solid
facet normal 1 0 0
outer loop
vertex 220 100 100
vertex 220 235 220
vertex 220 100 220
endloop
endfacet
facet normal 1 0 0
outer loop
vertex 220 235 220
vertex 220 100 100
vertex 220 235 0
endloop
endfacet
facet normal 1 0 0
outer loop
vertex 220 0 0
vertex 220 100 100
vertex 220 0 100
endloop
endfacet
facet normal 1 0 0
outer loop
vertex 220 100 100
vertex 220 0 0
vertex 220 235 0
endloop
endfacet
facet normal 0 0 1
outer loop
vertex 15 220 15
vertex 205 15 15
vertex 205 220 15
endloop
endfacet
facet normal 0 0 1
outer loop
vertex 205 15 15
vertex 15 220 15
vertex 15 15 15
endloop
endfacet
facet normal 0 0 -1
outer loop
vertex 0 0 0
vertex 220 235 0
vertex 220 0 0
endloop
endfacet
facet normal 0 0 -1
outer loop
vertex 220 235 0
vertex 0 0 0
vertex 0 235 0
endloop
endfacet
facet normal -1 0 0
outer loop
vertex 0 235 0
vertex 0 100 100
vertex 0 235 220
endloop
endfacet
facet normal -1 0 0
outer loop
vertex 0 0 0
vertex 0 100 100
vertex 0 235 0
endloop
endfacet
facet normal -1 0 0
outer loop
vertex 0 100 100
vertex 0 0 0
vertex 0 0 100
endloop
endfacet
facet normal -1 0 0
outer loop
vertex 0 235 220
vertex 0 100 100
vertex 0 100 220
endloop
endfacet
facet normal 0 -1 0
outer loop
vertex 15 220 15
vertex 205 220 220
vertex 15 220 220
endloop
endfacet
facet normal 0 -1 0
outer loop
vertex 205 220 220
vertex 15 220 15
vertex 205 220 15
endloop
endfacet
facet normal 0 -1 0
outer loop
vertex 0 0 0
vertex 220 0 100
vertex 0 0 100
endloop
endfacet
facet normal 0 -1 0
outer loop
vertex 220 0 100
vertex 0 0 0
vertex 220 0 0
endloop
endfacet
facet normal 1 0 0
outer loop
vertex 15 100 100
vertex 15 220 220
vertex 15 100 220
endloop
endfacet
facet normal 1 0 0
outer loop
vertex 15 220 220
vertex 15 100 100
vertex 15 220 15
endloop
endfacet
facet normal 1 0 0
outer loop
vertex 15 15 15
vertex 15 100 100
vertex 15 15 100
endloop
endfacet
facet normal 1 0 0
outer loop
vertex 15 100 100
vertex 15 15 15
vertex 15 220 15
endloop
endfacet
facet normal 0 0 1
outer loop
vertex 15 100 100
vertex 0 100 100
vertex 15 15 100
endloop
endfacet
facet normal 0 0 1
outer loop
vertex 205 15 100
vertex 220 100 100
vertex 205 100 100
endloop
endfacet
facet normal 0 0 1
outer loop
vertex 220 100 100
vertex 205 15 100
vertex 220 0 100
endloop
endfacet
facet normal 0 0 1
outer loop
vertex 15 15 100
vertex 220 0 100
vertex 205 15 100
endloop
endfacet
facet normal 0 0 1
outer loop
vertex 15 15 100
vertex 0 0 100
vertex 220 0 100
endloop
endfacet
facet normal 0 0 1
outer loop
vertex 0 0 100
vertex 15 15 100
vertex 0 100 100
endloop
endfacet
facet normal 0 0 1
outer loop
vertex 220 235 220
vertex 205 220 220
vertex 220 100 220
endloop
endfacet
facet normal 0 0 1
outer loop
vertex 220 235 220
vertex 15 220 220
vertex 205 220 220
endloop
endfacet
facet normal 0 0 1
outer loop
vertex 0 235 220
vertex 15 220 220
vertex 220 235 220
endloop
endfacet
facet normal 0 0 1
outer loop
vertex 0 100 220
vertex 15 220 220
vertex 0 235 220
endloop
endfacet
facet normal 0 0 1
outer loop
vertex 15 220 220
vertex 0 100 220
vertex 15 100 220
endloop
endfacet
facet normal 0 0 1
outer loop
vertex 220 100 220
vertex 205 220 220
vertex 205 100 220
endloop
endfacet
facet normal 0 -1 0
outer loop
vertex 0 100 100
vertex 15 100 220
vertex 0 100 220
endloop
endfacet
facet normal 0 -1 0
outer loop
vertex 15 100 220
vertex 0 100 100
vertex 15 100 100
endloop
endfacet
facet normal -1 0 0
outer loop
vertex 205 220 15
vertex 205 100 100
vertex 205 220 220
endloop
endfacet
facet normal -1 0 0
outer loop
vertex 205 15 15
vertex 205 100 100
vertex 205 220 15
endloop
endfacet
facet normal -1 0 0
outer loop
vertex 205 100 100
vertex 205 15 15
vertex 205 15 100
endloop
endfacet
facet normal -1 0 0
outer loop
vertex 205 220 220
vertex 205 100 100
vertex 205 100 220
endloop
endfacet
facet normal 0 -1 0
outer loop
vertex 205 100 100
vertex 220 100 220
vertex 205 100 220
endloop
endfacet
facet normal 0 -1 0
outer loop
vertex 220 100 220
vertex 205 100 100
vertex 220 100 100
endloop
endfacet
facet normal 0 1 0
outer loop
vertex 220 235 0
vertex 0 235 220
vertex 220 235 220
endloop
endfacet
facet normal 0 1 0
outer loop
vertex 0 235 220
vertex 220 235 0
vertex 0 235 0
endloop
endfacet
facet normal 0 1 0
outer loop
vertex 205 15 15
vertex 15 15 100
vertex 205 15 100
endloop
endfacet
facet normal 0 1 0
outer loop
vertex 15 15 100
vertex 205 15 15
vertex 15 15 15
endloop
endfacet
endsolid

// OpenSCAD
cube([220,220,15]);
    
cube([15,220,100]);

translate([0,100,100])
cube([15,120,120]);

translate([205,0,0])
cube([15,220,100]);

translate([205,100,100])
cube([15,120,120]);

translate([0,220,0])
cube([220,15,220]);

cube([220,15,100]);
